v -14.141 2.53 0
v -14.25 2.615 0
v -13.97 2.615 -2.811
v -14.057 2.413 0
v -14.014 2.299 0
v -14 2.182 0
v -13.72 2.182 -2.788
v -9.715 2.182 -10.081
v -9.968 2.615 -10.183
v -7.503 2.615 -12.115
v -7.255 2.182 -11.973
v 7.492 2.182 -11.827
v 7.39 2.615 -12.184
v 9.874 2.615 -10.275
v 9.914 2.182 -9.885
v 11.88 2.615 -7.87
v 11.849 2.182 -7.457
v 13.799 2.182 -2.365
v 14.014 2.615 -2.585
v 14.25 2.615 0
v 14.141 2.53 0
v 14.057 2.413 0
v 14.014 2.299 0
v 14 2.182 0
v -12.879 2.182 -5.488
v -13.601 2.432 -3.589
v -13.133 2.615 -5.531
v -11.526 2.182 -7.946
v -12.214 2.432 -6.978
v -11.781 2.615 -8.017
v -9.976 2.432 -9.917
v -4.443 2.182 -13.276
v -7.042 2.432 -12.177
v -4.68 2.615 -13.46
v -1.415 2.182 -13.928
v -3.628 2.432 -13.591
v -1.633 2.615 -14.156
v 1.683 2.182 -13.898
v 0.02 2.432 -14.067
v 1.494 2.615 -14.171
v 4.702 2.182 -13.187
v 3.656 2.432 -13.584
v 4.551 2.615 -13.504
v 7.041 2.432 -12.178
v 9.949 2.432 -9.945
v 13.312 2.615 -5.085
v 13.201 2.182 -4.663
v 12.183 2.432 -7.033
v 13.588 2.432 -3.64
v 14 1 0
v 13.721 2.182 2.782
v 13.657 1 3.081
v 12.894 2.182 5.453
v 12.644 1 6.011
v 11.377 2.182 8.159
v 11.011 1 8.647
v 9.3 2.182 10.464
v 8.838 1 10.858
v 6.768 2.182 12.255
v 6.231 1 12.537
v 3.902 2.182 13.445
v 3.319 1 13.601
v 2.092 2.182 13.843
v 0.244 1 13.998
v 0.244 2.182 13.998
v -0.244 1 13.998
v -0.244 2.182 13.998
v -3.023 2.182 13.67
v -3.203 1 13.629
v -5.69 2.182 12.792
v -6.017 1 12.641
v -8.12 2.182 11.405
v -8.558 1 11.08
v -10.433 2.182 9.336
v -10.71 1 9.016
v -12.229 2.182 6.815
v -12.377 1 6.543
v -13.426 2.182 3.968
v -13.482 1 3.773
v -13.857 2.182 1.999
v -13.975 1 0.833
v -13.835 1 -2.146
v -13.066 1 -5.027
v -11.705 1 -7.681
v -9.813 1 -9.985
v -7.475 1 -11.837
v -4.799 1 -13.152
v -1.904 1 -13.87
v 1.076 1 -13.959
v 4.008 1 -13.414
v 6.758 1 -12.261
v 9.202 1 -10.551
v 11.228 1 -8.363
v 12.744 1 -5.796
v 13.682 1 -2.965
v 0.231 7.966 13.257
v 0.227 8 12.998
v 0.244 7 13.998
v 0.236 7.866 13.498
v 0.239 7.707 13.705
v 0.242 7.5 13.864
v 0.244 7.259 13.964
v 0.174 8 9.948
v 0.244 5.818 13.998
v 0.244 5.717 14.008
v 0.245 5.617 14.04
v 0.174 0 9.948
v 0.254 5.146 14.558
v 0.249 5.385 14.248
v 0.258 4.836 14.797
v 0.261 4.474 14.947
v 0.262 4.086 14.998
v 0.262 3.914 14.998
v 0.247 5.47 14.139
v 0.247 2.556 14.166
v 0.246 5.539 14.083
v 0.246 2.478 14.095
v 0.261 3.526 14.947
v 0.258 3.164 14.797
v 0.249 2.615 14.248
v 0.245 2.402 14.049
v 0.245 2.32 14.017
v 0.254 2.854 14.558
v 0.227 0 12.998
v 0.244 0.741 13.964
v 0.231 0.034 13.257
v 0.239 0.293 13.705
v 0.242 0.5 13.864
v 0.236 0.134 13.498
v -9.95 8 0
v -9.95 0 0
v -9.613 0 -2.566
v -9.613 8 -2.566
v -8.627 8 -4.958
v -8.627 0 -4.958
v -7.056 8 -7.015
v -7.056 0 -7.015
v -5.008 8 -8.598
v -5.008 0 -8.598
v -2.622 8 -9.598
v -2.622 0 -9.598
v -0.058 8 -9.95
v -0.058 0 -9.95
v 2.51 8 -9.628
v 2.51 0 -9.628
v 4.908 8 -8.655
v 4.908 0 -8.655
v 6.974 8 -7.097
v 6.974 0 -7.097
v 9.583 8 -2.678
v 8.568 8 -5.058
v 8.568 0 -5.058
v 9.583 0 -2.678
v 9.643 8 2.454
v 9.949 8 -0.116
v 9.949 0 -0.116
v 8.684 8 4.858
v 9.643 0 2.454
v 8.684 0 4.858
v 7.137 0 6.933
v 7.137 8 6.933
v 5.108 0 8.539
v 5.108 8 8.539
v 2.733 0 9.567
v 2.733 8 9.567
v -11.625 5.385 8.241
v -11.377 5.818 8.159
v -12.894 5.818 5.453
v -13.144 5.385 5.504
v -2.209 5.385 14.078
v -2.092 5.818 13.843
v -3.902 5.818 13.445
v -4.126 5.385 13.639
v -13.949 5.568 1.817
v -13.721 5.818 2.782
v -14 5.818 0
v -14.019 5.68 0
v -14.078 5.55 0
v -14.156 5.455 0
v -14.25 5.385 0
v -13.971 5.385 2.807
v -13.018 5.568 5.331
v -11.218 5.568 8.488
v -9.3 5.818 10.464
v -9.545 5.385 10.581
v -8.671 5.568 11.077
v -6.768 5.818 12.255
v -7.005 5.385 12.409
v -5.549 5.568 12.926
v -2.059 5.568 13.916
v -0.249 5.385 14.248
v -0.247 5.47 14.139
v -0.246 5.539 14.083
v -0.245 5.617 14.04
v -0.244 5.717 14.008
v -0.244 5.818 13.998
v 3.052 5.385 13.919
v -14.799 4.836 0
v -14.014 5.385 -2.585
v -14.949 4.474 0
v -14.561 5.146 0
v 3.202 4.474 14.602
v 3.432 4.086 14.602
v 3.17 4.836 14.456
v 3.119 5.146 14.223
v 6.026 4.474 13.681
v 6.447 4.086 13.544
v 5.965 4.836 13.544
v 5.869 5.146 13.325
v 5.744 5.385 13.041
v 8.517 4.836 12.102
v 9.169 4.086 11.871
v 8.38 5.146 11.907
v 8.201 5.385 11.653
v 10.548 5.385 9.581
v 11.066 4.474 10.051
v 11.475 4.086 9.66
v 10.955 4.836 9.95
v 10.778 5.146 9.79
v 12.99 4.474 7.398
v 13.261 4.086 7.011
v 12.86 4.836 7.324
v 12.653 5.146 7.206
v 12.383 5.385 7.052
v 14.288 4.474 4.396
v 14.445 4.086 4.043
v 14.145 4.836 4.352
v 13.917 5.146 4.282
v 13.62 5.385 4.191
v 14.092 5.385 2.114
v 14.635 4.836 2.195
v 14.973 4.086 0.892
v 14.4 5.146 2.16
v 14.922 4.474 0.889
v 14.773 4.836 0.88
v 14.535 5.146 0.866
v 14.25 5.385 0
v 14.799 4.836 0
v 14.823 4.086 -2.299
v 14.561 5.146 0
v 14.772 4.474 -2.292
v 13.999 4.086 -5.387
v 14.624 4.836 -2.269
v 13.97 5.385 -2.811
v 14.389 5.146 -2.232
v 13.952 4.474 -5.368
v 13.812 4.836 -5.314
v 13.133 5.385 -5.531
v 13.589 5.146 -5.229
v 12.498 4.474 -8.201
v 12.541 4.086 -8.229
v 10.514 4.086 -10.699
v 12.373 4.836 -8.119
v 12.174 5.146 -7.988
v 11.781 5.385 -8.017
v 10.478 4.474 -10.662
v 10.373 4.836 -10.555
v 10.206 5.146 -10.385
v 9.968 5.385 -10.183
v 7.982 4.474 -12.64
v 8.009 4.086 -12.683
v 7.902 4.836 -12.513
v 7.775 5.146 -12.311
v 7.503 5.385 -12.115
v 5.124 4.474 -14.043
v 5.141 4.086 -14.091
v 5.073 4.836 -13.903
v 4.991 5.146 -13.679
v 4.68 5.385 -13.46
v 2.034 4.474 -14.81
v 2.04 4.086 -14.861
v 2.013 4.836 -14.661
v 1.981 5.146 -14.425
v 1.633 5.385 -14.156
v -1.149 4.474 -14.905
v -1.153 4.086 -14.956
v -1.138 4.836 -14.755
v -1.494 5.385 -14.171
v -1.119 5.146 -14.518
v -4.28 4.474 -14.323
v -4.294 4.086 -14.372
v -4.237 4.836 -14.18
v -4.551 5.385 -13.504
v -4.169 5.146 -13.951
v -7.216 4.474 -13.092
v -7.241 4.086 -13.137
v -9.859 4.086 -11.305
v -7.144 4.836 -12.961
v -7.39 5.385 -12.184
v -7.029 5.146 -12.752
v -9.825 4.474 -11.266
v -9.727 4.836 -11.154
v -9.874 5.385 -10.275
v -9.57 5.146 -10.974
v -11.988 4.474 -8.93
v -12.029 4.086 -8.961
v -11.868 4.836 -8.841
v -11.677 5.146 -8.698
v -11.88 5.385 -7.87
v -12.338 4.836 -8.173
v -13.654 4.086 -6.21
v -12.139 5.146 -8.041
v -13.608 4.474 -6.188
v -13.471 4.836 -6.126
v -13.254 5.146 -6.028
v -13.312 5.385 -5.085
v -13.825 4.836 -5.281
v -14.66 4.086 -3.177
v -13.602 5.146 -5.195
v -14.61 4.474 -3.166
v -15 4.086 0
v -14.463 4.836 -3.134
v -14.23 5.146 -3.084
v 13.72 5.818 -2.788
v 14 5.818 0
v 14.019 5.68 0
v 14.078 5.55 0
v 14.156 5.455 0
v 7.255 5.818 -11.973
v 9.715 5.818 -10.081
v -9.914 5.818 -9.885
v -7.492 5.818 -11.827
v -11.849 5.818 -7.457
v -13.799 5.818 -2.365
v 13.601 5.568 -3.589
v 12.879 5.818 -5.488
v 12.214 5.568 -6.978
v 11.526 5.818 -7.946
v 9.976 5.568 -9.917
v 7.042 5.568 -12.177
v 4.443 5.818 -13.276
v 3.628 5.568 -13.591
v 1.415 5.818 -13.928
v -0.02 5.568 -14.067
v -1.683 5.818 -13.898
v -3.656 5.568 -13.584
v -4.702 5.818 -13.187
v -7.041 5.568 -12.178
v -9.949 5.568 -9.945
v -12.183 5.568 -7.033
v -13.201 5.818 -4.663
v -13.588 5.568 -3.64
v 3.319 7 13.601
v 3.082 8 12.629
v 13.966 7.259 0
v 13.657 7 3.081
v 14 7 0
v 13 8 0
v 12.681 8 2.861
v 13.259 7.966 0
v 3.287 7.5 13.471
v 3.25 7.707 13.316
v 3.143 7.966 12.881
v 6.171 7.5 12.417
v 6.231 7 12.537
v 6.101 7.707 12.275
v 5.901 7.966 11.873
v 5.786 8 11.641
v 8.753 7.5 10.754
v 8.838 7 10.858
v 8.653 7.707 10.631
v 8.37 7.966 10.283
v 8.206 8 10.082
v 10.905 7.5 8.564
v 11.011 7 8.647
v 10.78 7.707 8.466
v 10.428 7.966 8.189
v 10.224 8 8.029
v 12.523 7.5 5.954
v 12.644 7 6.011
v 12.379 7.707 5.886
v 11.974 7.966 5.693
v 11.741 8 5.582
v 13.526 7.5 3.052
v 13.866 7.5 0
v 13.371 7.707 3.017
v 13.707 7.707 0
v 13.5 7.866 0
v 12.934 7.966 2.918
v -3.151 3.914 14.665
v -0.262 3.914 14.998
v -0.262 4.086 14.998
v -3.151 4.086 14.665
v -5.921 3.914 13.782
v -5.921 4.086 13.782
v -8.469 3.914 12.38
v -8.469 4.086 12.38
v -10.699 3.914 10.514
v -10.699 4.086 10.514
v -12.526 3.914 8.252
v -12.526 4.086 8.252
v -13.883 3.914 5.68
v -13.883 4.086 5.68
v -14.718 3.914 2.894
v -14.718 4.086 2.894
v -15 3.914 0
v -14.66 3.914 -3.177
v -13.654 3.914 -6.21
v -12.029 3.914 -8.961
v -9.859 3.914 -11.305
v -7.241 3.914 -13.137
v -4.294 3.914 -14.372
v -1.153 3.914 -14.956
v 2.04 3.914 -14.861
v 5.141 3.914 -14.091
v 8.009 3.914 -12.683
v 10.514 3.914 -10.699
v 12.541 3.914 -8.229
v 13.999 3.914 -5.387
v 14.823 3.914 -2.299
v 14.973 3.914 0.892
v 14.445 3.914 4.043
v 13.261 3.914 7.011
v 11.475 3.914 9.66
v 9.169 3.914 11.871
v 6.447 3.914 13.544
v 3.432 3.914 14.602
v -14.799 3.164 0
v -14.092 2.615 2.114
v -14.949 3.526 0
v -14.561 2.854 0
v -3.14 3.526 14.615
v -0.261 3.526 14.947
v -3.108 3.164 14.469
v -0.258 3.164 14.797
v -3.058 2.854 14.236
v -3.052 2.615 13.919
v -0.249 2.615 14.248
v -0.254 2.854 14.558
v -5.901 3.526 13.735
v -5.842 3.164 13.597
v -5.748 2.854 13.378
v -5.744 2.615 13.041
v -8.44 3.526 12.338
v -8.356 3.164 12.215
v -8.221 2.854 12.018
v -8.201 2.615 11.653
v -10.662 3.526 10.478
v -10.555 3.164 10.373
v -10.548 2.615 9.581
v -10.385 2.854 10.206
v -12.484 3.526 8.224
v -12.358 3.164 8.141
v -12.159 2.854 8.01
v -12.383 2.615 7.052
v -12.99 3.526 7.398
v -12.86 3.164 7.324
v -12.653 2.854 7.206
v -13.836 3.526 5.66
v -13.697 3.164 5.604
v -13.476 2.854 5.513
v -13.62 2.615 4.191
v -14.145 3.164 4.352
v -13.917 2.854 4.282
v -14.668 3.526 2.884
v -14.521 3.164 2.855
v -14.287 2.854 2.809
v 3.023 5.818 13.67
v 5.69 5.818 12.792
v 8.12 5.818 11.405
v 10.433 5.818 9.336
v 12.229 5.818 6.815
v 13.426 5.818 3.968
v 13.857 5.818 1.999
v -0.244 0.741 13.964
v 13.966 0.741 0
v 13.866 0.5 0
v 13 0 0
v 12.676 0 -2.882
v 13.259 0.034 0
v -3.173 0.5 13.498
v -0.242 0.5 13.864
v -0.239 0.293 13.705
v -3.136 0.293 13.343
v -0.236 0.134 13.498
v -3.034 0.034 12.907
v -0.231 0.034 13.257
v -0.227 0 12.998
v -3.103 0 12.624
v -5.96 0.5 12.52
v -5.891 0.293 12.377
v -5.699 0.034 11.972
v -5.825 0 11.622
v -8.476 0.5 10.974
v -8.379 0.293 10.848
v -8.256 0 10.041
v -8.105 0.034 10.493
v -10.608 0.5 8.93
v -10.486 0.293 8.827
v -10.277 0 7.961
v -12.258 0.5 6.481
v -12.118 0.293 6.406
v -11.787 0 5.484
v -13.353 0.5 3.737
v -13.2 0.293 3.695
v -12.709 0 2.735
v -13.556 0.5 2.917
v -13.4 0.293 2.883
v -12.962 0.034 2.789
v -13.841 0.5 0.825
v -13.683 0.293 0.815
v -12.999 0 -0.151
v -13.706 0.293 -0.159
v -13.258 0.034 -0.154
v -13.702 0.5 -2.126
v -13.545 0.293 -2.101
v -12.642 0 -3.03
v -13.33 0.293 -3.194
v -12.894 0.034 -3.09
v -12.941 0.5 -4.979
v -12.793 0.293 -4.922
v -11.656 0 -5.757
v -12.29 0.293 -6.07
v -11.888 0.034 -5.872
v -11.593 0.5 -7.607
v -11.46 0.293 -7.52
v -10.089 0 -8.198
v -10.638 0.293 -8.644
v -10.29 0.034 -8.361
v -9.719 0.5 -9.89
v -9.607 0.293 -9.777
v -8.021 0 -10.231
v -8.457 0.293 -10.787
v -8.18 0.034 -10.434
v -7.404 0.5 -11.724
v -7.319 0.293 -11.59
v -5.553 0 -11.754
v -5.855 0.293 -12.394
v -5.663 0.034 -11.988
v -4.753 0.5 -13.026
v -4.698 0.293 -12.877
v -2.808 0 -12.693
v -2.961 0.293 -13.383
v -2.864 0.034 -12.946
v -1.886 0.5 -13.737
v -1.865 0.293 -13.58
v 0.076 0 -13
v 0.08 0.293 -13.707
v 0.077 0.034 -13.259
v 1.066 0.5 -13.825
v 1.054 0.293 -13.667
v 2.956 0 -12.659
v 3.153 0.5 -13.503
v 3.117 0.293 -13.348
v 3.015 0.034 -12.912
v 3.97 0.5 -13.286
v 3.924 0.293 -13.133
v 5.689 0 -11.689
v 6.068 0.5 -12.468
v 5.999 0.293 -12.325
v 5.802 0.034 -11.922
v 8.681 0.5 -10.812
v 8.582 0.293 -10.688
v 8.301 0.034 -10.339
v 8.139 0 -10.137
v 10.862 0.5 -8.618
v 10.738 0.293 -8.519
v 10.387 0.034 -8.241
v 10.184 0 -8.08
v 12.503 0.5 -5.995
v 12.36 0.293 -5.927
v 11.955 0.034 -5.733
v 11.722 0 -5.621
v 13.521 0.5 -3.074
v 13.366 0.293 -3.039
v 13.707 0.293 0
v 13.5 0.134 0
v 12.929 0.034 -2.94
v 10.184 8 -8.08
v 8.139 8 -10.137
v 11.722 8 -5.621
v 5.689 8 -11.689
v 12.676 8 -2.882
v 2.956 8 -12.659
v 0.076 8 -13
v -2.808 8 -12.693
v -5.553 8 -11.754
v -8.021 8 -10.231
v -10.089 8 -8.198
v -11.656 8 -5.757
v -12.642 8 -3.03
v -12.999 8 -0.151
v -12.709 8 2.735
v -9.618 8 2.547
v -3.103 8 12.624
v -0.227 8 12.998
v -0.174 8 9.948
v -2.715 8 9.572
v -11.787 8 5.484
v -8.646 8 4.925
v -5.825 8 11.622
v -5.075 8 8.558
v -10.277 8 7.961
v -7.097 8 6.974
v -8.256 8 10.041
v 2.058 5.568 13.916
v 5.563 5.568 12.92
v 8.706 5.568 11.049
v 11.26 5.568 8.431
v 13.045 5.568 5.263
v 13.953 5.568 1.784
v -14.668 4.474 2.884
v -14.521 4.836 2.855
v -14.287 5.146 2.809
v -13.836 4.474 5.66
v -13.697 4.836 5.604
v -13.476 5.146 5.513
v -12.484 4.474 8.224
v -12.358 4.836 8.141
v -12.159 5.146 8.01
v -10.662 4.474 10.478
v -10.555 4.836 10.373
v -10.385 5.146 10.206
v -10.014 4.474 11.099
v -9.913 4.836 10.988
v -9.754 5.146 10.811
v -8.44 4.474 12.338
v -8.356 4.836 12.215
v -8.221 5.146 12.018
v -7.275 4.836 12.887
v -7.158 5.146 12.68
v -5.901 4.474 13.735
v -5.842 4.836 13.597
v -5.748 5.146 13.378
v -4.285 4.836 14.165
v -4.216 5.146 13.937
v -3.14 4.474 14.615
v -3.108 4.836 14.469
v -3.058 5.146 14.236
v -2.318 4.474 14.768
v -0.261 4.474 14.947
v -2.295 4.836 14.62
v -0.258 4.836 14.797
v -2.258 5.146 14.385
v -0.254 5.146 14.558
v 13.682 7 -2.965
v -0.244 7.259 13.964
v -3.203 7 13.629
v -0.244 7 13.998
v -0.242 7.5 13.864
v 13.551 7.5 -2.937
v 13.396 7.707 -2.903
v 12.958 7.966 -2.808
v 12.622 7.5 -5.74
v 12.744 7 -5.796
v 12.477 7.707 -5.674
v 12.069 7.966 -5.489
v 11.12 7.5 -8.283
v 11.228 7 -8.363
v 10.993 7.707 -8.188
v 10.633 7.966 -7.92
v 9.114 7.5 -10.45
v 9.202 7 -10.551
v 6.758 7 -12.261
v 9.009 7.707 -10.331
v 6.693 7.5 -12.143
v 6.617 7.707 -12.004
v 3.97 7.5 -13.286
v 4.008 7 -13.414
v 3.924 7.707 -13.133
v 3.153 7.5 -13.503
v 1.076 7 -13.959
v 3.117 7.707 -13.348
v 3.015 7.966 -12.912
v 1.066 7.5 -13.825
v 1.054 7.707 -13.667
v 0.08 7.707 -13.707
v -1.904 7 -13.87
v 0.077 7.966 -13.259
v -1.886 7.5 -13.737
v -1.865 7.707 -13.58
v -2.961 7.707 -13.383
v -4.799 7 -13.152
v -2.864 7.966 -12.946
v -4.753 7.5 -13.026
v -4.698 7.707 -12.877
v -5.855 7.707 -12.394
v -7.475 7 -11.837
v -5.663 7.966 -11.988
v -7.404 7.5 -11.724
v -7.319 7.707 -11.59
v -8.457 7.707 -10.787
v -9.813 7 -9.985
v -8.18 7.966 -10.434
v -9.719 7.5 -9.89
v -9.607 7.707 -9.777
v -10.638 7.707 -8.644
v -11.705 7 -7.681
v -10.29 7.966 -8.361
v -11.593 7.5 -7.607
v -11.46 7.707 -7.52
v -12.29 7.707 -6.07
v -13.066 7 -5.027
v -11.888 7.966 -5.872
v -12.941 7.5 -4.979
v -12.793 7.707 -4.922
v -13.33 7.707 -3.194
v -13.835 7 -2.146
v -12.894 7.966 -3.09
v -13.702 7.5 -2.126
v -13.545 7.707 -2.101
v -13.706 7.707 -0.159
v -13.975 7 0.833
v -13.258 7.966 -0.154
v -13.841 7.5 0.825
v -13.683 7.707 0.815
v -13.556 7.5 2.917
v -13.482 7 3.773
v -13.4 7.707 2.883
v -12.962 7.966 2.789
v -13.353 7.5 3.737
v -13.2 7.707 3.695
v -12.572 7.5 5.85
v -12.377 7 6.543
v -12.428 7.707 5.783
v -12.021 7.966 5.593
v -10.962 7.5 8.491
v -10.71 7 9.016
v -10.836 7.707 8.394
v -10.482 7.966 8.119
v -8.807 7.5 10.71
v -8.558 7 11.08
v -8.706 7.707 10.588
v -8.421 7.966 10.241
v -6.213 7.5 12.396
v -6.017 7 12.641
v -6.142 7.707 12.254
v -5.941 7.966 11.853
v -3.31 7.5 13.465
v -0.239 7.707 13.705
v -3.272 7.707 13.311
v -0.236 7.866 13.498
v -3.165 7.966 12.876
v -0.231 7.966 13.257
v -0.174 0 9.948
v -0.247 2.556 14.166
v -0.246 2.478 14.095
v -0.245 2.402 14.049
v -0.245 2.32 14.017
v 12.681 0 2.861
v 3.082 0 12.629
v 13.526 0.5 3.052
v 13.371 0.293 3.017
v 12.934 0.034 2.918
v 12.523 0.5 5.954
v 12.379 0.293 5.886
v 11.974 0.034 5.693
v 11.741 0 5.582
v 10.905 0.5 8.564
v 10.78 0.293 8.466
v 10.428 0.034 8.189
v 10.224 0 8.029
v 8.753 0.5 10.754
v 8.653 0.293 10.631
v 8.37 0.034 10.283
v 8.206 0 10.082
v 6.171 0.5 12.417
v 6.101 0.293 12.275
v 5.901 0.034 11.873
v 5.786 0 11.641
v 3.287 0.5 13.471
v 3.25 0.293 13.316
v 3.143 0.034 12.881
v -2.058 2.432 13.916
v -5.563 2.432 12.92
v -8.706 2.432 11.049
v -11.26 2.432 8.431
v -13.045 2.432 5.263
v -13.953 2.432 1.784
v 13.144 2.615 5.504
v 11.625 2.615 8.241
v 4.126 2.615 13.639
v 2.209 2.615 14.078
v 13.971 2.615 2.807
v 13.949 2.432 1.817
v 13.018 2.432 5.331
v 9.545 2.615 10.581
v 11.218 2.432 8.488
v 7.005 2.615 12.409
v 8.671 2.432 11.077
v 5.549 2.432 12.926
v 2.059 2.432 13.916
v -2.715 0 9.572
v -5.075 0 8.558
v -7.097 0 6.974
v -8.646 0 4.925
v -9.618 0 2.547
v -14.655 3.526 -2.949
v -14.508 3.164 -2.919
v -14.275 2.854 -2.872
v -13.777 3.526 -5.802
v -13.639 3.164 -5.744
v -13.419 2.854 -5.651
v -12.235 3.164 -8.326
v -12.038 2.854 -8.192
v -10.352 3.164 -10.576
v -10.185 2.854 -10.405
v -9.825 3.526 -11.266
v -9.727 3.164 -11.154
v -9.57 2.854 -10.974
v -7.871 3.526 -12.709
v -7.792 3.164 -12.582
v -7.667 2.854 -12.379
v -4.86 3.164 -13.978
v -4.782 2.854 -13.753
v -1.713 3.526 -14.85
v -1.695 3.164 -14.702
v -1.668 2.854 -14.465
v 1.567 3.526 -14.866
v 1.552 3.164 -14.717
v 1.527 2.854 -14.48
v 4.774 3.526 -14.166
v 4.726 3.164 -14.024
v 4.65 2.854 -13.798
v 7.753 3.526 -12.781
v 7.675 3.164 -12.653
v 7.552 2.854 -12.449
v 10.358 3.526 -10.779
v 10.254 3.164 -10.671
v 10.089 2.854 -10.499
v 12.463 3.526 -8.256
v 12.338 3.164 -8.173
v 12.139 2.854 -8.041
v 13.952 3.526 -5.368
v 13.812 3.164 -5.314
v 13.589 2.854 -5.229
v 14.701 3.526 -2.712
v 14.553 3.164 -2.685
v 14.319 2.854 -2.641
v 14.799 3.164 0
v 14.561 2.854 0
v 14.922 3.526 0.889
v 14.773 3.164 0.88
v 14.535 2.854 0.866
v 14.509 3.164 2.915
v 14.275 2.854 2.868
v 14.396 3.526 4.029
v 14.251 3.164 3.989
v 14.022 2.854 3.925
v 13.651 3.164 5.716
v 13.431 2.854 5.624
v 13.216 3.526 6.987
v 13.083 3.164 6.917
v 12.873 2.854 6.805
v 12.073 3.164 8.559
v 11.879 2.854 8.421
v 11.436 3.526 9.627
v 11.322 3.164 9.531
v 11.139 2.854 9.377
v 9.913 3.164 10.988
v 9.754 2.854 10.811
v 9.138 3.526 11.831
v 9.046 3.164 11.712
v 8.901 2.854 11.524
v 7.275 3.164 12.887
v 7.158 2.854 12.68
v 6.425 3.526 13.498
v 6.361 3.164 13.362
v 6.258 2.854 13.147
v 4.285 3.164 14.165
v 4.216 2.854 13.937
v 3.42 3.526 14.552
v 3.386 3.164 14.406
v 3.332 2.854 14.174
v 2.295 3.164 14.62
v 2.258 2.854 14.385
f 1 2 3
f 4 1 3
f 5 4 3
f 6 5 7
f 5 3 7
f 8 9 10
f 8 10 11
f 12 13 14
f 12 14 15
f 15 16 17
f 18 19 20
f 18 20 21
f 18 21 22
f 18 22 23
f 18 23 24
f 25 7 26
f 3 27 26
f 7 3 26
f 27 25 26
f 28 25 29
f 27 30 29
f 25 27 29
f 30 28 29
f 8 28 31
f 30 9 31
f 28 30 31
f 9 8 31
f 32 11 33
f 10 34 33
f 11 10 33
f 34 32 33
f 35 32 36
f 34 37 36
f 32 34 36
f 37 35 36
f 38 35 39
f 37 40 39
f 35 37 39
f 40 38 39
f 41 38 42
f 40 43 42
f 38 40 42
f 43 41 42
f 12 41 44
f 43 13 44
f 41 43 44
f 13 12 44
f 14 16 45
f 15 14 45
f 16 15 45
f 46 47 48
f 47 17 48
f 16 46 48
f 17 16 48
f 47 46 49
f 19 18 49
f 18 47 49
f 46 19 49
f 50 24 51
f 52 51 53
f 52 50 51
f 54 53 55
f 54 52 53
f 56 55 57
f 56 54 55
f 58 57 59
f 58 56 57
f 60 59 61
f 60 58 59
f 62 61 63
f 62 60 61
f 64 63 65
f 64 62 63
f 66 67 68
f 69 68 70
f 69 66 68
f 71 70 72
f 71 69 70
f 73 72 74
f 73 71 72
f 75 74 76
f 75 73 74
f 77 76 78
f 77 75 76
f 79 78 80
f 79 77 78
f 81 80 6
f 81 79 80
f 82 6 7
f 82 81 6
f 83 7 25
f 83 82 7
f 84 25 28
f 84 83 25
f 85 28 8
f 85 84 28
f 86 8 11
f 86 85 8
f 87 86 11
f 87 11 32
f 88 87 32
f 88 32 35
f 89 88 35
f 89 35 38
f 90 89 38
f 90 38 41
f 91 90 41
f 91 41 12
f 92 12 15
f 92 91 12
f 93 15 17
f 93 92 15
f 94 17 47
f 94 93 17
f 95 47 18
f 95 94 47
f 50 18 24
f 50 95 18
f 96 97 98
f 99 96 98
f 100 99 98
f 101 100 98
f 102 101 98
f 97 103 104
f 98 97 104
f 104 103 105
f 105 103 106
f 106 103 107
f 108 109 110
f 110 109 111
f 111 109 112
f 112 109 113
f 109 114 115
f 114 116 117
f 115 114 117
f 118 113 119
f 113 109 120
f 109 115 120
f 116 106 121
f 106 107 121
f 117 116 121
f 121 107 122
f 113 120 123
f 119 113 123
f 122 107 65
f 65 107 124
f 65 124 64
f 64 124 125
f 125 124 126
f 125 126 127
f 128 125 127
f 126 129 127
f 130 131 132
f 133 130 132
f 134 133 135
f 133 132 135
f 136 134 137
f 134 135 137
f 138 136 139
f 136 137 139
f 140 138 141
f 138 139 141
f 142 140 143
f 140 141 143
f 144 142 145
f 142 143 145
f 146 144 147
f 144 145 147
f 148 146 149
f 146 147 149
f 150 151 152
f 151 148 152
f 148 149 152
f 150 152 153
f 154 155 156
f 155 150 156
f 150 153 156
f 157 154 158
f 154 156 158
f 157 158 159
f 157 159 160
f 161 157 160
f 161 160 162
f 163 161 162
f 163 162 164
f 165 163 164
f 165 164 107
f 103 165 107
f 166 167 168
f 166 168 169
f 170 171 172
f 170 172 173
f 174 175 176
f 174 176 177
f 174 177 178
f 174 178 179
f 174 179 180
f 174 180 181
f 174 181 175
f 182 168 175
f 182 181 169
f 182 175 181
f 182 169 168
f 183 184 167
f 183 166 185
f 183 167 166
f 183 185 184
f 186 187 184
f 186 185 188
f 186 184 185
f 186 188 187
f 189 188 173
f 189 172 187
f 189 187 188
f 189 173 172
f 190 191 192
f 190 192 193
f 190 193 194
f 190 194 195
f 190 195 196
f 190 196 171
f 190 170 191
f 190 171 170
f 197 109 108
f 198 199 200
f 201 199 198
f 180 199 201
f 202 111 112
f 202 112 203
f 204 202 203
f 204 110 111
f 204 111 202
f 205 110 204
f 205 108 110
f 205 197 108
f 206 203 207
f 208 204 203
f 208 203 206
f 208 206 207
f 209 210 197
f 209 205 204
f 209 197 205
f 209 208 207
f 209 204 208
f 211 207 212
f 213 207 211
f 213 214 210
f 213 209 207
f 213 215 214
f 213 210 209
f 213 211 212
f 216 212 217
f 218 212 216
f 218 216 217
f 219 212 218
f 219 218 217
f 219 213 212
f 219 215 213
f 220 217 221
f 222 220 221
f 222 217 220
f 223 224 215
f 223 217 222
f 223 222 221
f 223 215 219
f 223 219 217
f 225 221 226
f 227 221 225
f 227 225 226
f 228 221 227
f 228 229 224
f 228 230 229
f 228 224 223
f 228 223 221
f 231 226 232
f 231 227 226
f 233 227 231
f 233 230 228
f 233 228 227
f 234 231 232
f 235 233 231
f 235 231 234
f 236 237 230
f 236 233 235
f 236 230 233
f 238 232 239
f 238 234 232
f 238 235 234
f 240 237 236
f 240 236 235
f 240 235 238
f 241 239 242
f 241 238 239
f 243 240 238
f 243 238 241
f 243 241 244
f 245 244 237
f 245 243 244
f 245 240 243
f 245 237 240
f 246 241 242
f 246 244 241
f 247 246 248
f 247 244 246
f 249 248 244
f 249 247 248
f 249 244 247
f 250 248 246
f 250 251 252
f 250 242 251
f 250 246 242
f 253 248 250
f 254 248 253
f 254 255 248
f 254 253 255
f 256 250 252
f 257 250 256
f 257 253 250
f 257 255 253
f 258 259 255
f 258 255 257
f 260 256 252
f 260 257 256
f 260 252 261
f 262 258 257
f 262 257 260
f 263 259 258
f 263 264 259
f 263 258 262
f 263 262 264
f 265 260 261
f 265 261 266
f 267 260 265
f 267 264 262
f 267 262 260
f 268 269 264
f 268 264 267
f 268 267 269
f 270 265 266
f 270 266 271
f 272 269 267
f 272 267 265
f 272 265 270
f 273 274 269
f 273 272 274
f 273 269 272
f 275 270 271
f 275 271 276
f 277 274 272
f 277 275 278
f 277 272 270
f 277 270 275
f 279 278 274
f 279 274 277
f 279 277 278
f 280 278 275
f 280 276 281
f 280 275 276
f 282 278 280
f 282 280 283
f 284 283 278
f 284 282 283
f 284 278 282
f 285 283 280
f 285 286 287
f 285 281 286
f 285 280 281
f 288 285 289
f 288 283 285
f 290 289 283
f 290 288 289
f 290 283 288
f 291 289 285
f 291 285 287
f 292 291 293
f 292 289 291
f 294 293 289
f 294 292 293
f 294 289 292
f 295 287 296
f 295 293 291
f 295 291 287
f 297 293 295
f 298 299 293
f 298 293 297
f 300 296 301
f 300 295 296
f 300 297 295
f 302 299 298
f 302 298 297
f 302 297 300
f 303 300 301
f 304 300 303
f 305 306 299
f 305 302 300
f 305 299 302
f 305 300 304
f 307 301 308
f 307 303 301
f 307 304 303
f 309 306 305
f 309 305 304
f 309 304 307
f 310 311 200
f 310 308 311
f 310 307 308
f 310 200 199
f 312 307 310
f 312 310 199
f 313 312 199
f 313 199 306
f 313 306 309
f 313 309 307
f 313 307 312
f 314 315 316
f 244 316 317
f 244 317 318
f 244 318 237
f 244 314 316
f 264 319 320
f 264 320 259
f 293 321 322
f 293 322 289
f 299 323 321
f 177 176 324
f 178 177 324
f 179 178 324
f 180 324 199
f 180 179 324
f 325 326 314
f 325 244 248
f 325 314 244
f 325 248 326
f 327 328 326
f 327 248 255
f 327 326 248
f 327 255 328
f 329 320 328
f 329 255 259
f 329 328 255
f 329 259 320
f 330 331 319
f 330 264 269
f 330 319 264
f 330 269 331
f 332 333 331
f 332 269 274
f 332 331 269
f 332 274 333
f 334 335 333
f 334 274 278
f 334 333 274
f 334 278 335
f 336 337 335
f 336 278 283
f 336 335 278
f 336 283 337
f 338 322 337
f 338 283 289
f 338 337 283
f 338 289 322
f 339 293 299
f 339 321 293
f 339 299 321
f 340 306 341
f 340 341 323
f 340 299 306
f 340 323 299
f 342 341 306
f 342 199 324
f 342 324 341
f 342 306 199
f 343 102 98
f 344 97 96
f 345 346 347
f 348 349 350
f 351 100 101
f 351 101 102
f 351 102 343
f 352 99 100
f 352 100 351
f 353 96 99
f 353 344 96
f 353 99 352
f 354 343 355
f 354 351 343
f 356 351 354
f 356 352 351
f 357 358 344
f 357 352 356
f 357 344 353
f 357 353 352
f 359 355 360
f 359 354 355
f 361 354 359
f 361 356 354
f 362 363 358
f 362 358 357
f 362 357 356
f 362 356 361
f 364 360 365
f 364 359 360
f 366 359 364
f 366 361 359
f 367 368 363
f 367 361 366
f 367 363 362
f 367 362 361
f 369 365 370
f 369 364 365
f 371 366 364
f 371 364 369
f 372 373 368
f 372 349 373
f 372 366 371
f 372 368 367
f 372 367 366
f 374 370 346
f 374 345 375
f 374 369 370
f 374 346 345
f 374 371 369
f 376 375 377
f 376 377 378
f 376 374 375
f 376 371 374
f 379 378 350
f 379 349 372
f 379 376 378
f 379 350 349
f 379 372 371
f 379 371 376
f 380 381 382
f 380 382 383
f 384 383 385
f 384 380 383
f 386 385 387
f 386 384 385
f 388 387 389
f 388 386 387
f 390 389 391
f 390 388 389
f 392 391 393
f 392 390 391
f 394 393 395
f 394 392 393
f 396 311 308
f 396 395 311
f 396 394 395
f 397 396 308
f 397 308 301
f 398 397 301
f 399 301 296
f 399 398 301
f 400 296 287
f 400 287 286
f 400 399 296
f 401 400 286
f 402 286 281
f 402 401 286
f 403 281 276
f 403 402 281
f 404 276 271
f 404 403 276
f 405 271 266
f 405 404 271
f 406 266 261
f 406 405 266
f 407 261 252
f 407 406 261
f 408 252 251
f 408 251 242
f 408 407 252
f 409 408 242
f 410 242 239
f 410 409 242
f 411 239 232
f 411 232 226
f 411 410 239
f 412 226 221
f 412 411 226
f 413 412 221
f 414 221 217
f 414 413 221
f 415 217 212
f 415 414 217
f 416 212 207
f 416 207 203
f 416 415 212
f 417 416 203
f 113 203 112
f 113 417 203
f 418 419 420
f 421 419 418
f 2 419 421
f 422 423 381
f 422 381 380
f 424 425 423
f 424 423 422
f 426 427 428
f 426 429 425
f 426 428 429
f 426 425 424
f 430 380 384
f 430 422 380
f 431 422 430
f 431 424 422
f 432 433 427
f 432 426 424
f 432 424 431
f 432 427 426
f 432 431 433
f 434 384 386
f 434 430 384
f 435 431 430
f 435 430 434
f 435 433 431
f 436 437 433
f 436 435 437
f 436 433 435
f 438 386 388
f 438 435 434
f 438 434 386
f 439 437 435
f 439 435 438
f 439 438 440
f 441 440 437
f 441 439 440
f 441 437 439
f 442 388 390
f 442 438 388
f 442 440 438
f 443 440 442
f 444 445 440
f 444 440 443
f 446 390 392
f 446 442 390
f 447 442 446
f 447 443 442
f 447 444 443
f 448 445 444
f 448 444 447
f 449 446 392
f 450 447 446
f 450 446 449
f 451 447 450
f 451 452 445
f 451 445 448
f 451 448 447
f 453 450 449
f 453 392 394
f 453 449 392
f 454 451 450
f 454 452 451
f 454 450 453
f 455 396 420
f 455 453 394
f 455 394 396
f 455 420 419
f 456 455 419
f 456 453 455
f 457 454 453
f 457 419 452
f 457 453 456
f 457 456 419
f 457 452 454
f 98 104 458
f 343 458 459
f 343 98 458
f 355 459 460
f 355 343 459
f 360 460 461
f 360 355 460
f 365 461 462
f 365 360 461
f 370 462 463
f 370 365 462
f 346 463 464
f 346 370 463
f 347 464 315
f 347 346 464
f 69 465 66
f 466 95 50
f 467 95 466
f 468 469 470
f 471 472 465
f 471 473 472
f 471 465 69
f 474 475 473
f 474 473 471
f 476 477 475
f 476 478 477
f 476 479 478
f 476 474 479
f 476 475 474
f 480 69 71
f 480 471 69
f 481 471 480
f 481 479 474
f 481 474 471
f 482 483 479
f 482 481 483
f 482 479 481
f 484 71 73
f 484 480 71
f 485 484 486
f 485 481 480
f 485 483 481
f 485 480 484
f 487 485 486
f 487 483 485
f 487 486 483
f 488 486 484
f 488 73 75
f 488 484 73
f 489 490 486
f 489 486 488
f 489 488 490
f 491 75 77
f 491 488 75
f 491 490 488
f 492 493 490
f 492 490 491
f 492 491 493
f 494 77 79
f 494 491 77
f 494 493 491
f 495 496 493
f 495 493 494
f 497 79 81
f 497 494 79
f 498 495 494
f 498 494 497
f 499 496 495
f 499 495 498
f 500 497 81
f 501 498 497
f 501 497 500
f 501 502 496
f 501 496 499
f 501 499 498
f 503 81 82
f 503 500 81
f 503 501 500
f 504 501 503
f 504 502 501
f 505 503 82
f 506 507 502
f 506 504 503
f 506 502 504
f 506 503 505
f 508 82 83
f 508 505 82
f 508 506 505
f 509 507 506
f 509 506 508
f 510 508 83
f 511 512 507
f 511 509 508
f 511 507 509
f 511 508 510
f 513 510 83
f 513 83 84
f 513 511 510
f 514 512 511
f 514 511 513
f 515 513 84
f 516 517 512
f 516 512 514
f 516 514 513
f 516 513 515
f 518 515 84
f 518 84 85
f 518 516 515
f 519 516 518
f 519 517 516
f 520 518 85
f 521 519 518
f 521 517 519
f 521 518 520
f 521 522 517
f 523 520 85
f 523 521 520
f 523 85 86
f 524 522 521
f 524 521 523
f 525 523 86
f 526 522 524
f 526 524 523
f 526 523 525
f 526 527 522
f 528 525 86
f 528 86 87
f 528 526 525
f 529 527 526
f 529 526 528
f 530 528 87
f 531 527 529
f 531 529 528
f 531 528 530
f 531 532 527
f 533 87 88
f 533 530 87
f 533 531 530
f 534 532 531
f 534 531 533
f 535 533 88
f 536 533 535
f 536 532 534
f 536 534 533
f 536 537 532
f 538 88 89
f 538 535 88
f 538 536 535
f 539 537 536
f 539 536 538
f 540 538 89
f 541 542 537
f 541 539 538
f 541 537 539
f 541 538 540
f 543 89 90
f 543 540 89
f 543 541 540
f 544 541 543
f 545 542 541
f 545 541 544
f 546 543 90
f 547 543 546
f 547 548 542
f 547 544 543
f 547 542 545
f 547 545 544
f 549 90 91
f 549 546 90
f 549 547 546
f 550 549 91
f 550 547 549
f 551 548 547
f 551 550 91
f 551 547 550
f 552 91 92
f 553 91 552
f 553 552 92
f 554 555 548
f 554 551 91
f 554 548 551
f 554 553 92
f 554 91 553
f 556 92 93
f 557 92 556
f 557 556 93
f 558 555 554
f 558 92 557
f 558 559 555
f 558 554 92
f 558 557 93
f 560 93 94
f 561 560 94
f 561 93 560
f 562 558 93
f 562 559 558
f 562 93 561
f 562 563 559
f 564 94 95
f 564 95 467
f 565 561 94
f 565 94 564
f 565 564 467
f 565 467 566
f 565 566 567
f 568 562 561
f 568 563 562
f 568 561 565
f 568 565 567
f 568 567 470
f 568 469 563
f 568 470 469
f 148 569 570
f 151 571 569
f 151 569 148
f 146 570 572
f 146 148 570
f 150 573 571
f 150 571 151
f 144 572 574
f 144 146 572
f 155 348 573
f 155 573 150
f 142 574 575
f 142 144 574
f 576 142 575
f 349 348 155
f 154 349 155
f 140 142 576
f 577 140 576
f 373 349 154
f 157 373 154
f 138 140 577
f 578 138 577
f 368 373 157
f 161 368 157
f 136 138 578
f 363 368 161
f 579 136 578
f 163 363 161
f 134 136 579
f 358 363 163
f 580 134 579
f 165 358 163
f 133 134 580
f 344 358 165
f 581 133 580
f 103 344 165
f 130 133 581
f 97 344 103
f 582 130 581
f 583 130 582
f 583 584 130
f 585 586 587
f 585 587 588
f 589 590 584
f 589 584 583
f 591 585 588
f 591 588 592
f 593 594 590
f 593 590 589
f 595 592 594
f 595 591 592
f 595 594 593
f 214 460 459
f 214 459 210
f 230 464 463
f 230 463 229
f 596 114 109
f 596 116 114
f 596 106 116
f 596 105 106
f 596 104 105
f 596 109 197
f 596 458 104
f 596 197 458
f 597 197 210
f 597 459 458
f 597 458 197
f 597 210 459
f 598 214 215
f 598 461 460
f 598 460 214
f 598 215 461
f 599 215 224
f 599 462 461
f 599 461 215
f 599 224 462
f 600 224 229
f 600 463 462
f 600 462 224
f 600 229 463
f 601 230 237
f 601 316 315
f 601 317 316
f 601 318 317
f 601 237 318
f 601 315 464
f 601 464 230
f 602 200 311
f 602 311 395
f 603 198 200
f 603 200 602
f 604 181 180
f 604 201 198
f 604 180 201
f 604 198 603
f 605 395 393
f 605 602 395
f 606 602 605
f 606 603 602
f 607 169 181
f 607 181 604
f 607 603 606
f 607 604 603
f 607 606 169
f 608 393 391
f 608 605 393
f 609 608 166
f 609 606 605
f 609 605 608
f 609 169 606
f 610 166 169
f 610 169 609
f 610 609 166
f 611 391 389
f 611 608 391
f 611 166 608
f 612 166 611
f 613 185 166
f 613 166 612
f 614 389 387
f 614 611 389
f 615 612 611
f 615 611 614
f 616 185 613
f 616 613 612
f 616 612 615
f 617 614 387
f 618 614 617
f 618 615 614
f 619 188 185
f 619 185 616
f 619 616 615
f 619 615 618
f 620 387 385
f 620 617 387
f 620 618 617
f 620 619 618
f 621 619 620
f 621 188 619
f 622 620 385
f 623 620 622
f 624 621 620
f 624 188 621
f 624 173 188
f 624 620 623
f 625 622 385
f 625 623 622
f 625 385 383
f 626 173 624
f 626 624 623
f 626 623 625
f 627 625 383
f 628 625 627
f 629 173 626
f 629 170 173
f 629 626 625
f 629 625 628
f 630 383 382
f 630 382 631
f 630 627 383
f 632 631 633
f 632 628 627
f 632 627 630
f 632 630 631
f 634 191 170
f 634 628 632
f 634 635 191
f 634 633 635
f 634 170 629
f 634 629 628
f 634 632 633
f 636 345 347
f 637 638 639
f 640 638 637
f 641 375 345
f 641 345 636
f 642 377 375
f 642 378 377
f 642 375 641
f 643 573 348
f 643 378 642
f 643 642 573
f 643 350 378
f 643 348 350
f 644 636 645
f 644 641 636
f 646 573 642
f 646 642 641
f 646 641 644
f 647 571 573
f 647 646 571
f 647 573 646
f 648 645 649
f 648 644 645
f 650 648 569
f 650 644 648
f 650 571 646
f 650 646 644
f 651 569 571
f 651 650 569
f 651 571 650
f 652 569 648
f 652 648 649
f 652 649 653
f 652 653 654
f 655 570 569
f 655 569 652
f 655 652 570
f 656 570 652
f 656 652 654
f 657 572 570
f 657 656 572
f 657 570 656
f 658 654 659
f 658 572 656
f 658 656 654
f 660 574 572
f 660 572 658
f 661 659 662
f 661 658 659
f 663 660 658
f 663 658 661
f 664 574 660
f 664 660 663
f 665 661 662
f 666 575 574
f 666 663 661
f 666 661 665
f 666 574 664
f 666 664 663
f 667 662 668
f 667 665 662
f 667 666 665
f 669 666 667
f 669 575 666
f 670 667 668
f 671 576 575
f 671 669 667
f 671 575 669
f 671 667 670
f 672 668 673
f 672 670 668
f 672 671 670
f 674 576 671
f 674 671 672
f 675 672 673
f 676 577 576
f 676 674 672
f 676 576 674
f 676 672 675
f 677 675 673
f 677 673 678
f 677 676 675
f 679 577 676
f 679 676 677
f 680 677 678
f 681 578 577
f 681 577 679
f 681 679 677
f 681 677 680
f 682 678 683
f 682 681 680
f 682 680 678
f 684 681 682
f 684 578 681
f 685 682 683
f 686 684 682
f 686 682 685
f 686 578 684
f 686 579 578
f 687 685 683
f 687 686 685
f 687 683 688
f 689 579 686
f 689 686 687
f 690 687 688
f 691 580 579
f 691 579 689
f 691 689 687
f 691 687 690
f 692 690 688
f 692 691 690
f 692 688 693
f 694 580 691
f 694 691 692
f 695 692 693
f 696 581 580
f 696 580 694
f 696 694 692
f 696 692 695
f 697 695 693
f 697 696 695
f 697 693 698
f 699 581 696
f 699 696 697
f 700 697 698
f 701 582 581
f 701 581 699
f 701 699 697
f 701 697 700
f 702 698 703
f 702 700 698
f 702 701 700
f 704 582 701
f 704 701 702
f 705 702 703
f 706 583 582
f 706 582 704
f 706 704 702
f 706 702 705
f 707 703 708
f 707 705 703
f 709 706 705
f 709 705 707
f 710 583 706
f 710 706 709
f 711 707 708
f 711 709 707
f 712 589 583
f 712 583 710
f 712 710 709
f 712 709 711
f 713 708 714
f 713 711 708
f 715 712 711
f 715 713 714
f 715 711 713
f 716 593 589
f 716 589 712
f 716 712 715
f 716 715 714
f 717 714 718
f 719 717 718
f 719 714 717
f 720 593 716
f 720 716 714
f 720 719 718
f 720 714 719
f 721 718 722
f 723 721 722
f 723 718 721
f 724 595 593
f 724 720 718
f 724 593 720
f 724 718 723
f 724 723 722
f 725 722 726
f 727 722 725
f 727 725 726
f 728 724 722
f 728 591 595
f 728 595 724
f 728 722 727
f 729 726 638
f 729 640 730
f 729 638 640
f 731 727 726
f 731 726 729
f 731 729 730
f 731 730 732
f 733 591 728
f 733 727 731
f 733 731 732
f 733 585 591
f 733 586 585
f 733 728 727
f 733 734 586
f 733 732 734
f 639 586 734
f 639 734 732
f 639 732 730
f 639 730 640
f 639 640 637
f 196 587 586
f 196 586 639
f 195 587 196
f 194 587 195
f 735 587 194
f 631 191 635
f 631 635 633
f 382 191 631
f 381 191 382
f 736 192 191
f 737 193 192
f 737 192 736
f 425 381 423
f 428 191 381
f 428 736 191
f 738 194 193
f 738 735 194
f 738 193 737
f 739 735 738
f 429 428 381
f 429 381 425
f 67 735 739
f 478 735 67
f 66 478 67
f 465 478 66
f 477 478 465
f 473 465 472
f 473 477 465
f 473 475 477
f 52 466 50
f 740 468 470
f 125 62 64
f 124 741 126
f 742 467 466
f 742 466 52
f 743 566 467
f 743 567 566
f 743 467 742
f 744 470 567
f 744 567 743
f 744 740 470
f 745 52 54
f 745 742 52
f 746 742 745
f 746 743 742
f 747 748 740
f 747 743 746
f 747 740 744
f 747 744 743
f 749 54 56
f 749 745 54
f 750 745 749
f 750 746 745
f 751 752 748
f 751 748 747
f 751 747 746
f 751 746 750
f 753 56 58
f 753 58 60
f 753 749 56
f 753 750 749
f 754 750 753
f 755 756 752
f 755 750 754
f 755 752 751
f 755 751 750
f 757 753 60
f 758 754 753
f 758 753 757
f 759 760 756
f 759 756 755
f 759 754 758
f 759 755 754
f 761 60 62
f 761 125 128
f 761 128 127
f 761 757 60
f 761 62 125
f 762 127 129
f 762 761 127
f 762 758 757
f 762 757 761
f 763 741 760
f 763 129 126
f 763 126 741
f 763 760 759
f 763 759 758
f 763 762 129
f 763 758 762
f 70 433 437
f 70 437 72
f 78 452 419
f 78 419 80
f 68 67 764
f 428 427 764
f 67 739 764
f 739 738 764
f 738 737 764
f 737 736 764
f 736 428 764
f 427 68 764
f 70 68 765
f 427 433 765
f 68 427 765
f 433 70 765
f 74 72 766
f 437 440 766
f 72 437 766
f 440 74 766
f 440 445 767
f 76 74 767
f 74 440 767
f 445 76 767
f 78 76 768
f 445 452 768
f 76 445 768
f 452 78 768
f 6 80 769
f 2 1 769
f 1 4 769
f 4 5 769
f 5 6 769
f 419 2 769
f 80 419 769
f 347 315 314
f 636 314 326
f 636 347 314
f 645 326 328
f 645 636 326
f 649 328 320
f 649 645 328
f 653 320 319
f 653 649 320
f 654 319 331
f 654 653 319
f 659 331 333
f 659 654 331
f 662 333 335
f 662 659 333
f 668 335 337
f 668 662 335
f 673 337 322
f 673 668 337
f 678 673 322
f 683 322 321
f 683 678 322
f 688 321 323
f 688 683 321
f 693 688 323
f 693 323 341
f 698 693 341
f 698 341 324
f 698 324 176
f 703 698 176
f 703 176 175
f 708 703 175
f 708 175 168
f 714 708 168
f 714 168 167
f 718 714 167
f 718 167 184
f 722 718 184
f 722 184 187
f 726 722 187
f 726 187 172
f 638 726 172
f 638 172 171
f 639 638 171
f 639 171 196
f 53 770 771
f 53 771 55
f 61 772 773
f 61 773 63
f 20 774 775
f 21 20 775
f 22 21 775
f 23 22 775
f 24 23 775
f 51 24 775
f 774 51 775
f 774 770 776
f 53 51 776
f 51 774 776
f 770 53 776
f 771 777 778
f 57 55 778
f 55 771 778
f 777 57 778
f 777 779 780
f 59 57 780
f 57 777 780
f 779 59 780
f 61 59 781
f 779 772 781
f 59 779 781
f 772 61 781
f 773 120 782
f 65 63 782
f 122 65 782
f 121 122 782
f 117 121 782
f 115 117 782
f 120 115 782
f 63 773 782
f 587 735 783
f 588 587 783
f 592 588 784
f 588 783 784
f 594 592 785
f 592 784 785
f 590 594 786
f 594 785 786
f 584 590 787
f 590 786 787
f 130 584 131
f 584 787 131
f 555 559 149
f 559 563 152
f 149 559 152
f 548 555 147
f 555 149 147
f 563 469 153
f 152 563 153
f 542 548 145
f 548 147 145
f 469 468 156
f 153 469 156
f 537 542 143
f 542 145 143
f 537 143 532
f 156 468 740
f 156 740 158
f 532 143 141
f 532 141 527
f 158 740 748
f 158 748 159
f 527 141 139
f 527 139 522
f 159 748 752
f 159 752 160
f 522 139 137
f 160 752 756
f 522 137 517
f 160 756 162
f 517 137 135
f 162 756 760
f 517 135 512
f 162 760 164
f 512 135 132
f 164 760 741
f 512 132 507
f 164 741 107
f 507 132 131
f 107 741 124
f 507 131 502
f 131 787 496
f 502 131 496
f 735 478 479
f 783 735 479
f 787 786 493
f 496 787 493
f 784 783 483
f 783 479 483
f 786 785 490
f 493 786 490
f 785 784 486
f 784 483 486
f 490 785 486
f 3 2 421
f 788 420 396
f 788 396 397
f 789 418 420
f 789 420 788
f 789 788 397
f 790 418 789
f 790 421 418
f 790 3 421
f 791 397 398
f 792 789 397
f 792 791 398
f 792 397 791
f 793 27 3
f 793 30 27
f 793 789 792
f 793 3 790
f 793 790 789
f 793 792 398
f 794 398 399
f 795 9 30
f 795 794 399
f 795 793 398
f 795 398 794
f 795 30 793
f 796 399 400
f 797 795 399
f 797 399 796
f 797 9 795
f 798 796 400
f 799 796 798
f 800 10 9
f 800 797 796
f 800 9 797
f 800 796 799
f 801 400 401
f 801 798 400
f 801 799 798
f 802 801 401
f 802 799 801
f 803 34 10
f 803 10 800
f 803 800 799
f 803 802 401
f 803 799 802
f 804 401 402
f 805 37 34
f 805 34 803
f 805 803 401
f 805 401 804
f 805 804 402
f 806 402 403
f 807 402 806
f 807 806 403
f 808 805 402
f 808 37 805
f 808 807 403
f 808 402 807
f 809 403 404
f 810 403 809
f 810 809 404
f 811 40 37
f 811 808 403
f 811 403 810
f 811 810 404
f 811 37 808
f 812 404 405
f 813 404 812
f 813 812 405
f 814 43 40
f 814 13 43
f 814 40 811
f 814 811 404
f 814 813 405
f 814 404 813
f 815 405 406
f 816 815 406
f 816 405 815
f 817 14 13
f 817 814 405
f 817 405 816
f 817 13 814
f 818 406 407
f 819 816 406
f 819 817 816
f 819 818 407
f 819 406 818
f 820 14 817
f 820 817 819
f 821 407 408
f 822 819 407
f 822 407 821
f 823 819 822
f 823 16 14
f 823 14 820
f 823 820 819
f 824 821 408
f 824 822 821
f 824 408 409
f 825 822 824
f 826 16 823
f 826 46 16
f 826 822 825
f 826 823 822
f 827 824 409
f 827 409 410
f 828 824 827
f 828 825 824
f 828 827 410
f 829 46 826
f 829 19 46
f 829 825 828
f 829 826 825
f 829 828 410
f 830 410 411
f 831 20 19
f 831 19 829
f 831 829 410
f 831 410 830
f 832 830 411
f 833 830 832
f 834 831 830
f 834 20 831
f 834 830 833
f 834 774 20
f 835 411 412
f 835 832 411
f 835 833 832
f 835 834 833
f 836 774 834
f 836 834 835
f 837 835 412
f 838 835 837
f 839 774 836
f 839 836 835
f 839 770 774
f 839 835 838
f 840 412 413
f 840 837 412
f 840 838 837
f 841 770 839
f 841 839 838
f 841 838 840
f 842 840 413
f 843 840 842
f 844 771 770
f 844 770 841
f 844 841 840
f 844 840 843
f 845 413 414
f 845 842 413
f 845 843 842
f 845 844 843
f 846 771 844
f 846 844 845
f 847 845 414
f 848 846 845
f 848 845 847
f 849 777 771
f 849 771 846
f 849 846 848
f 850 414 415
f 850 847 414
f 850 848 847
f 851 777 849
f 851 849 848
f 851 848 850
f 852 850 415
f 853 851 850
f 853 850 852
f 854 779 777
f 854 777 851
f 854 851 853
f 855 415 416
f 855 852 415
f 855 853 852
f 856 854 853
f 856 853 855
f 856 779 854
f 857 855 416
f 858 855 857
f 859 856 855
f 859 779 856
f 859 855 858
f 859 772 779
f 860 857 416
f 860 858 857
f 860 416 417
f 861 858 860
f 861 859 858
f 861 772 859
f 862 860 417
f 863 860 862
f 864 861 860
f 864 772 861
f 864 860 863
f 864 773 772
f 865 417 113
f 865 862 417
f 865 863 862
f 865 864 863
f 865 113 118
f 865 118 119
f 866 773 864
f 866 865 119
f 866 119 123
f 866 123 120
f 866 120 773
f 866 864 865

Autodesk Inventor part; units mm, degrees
ref_plane "YZ Plane" through (0, 0, 0) normal (1, 0, 0) x (0, 1, 0)
ref_plane "XZ Plane" through (0, 0, 0) normal (0, 1, 0) x (-1, 0, 0)
ref_plane "XY Plane" through (0, 0, 0) normal (0, 0, 1) x (1, 0, 0)
sketch "Esboço1" plane through (0, 0, 0) normal (0, 1, 0) x (-1, 0, 0)
  circle A0 centre (0, 0) radius 15
  circle A1 centre (0, 0) radius 9.95
  dimension "d0" = 30
  dimension "d1" = 19.9
extrude "Extrusão1" add sketch "Esboço1" along normal blind 8
sketch "Esboço2" plane through (0, 8, 0) normal (0, 1, 0) x (1, 0, 0)
  circle A0 centre (0, 0) radius 15
  circle A1 centre (0, 0) radius 14
  dimension "d4" = 30
  dimension "d5" = 28
extrude "Extrusão2" cut sketch "Esboço2" against normal blind 2.5
sketch "Esboço3" plane through (0, 0, 0) normal (0, -1, 0) x (1, 0, 0)
  circle A0 centre (0, 0) radius 15
  circle A1 centre (0, 0) radius 14 projected
  circle A2 centre (0, 0) radius 14
  dimension "d8" = 30
extrude "Extrusão3" cut sketch "Esboço3" against normal blind 2.5
fillet "Arredondamento1" radius 1.5 1 edges at (15, 2.5, 0)
fillet "Arredondamento2" radius 1.5 1 edges at (15, 5.5, 0)
fillet "Arredondamento3" radius 1 2 edges at (-14, 0, 0) (-14, 8, 0)
fillet "Arredondamento4" radius 0.5 4 edges at (0, 2.5, 14) (0, 2.5, -14) (0, 5.5, 14) (0, 5.5, -14)
sketch "Esboço4" plane through (0, 0, 0) normal (0, -1, 0) x (1, 0, 0)
  line L0 (0, 0) -> (-0.3141, 17.9973)
  line L1 (0, 0) -> (18, 0) construction
  line L2 (0, 0) -> (0.3141, 17.9973)
  line L3 (0, 0) -> (18, 0) construction
  line L4 (0.3141, 17.9973) -> (-0.3141, 17.9973)
  dimension "d15" = 18
  dimension "d16" = 91
  dimension "d17" = 18
  dimension "d18" = 89
extrude "Extrusão4" cut sketch "Esboço4" against normal up to surface (8 mm away)
properties part number "anel rotacao sonda completo com gap"
